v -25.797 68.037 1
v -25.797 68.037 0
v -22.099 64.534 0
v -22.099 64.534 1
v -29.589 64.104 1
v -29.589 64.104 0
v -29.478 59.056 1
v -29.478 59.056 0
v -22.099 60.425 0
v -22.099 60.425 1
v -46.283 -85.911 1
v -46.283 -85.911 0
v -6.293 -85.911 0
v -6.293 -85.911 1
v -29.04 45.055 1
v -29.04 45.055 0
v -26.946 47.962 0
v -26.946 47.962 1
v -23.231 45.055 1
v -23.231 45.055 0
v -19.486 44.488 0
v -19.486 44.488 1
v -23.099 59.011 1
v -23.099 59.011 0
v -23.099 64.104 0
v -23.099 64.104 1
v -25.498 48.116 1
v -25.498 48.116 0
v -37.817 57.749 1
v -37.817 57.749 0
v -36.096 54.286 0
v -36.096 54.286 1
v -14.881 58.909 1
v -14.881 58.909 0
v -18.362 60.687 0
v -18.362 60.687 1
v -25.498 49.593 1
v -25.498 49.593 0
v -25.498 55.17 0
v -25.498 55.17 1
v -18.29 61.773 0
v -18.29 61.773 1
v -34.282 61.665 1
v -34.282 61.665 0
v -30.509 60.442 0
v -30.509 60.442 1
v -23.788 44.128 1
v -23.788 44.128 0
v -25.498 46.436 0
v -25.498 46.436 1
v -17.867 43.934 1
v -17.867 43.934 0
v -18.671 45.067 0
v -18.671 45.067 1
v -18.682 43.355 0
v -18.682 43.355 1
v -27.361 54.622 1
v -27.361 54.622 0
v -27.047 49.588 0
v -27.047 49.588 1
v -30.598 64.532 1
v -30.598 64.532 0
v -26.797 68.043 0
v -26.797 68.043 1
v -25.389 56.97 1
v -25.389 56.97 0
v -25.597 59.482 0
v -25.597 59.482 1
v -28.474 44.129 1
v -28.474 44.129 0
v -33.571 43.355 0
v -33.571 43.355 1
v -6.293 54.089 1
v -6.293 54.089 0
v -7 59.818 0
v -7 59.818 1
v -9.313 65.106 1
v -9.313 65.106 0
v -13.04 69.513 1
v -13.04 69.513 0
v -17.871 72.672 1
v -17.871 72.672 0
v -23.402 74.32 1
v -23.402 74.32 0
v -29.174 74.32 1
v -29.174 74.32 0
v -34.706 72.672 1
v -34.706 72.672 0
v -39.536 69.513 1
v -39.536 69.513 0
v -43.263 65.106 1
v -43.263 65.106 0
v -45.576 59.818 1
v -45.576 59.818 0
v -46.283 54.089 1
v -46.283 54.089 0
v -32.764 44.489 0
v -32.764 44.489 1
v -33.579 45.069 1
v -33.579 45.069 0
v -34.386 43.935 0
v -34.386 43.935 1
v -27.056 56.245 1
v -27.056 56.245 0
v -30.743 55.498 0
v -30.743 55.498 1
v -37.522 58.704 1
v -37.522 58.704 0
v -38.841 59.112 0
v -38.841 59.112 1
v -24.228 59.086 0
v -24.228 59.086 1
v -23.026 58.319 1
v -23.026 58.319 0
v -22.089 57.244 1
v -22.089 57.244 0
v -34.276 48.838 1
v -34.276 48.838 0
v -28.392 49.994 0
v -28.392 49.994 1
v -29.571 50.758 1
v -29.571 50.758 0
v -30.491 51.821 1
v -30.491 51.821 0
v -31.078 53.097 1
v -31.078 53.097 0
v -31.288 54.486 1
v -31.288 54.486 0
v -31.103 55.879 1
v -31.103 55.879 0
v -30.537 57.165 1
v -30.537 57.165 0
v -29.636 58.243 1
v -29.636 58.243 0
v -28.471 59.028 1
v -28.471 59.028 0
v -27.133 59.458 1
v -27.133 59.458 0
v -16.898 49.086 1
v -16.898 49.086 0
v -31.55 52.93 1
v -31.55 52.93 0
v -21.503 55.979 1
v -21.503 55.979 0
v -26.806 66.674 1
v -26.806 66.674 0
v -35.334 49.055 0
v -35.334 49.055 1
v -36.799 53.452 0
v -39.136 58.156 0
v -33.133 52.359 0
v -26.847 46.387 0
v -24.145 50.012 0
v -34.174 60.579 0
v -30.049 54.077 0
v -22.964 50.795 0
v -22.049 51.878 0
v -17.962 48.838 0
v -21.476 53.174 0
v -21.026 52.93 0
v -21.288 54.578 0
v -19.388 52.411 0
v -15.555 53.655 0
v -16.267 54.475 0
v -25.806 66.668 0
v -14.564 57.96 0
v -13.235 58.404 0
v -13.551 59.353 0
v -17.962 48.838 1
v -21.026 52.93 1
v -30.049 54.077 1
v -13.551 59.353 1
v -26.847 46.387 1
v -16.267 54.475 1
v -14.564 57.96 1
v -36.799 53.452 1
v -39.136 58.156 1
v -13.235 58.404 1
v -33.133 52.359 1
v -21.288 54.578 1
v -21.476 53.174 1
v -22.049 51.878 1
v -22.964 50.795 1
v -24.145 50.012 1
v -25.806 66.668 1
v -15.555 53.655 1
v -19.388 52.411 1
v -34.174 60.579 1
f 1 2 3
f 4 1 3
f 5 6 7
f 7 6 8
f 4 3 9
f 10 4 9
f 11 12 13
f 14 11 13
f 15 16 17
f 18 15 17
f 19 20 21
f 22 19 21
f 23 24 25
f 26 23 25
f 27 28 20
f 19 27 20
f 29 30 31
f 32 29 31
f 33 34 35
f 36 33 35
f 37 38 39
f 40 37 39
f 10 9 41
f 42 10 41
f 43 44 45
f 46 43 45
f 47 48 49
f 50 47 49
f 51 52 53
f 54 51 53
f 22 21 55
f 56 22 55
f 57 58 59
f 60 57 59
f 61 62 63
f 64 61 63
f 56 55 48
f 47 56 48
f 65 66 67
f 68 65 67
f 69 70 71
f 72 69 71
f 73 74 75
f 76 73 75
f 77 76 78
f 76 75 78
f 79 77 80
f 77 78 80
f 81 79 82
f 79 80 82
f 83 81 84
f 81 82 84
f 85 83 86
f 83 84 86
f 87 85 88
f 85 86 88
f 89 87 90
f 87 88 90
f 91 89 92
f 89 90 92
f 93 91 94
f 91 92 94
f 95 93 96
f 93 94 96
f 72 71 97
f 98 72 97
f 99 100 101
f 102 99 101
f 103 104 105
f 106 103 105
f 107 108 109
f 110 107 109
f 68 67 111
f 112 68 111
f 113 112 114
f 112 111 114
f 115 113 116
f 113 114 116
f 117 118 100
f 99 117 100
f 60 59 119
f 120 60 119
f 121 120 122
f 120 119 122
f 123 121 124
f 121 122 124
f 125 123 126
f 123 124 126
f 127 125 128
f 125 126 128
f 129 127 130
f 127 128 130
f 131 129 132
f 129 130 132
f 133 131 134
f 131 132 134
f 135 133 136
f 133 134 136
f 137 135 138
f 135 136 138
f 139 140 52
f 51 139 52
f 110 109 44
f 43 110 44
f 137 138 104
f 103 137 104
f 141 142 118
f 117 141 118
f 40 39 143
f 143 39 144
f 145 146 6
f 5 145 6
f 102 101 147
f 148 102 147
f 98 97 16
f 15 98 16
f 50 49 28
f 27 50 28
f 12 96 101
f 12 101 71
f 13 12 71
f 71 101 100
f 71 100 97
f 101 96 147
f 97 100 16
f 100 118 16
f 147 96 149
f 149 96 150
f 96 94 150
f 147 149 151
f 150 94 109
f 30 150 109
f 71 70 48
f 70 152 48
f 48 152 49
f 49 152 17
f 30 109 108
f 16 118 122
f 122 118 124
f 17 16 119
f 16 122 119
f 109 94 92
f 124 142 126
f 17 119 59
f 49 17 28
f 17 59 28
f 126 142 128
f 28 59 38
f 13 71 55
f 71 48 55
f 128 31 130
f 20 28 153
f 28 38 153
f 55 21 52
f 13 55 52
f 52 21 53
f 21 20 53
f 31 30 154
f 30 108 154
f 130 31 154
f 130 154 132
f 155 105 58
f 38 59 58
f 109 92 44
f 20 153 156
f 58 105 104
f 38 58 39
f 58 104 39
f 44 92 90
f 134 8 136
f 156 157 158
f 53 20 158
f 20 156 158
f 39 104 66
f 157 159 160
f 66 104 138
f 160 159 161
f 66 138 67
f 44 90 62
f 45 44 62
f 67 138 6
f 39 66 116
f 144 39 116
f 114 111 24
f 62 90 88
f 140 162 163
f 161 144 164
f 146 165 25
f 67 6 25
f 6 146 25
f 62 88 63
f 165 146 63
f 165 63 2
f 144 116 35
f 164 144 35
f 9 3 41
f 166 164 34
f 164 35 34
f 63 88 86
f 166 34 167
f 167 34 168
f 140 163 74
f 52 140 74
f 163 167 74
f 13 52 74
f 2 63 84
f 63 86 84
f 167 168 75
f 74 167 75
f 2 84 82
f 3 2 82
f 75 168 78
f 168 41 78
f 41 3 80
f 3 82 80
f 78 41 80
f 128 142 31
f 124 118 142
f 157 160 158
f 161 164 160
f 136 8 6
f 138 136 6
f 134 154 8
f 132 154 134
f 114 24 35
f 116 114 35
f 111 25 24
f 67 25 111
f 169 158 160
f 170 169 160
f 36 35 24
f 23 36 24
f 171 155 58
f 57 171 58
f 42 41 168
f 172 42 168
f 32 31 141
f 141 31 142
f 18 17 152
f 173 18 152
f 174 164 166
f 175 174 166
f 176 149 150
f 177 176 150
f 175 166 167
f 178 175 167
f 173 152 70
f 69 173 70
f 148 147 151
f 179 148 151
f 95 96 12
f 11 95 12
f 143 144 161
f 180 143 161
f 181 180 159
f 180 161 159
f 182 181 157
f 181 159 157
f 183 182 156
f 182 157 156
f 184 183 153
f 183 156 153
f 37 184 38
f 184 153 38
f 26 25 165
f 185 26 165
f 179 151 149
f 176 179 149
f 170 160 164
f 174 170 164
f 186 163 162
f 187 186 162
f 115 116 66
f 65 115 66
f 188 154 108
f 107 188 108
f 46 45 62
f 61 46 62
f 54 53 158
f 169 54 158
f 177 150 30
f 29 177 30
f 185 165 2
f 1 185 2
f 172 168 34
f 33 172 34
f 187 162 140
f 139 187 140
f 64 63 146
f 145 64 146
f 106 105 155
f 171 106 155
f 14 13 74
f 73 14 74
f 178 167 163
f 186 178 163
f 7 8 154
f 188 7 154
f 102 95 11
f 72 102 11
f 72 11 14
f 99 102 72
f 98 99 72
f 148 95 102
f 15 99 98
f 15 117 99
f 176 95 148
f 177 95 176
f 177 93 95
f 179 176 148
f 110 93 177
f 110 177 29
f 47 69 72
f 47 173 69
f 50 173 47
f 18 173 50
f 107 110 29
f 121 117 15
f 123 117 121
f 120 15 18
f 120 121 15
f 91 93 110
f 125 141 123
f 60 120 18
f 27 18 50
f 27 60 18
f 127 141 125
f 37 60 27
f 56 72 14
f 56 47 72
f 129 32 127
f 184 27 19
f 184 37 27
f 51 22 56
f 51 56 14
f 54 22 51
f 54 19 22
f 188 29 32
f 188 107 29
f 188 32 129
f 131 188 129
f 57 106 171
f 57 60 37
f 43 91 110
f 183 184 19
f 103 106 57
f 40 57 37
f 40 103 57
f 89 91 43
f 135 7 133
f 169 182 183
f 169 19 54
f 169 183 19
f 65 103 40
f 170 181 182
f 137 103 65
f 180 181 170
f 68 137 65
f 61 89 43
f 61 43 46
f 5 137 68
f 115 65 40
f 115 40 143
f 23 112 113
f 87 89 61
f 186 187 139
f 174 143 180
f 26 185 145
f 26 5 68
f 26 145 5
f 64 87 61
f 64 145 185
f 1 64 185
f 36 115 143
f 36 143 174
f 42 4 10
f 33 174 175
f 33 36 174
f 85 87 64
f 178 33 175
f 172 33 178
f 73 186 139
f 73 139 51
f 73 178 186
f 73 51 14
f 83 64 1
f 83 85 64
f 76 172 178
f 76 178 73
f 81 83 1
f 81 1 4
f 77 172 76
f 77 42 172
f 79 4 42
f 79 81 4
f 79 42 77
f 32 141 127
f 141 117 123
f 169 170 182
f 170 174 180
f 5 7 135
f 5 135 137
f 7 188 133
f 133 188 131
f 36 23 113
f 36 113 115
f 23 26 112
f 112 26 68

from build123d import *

# Parameters (mm, degrees)
F1_DEPTH = 1


with BuildPart() as f1:
    # F0 (on Top) → F1 (new body)
    with BuildSketch(Plane.XY):
        with BuildLine():
            Line((-6.292982, -85.910741), (-6.292982, 54.089259))
            ThreePointArc((-6.292982, 54.089259), (-26.288129, 74.529796), (-46.283277, 54.089259))
            Line((-46.283277, 54.089259), (-46.283277, -85.910741))
            Line((-46.283277, -85.910741), (-6.292982, -85.910741))
        make_face()
        Polygon((-39.135793, 58.156283), (-37.816775, 57.748809), (-36.096451, 54.285815), (-31.550451, 52.930429), (-34.276498, 48.838314), (-33.578717, 45.068727), (-34.385781, 43.934663), (-35.333624, 49.055149), (-33.132877, 52.358728), (-36.79867, 53.451681), align=None, mode=Mode.SUBTRACT)
        Polygon((-33.571035, 43.354844), (-32.763971, 44.488907), (-29.039516, 45.054648), (-26.94571, 47.962227), (-26.847435, 46.38745), (-28.473701, 44.129124), align=None, mode=Mode.SUBTRACT)
        Polygon((-29.588758, 64.103655), (-29.478391, 59.056225), (-34.174348, 60.578728), (-37.521616, 58.704257), (-38.840633, 59.111731), (-34.281651, 61.664762), (-30.508922, 60.441584), (-30.598373, 64.532466), (-26.796919, 68.043156), (-26.805587, 66.673948), align=None, mode=Mode.SUBTRACT)
        with BuildLine():
            Line((-30.048708, 54.077201), (-27.361293, 54.621597))
            Line((-27.361293, 54.621597), (-27.047152, 49.587743))
            ThreePointArc((-27.047152, 49.587743), (-31.287939, 54.486218), (-27.133178, 59.457868))
            Line((-27.133178, 59.457868), (-27.056337, 56.245149))
            Line((-27.056337, 56.245149), (-30.742993, 55.498334))
            Line((-30.742993, 55.498334), (-30.048708, 54.077201))
        make_face(mode=Mode.SUBTRACT)
        Polygon((-25.498227, 46.435824), (-25.498227, 48.115821), (-23.230623, 45.054648), (-19.486444, 44.488301), (-18.682042, 43.355251), (-23.788412, 44.127645), align=None, mode=Mode.SUBTRACT)
        with BuildLine():
            Line((-25.498227, 49.592584), (-25.498227, 55.169558))
            Line((-25.498227, 55.169558), (-21.502735, 55.978935))
            ThreePointArc((-21.502735, 55.978935), (-22.049338, 51.877881), (-25.498227, 49.592584))
        make_face(mode=Mode.SUBTRACT)
        Polygon((-17.866638, 43.934143), (-18.67104, 45.067193), (-17.961659, 48.838314), (-21.025808, 52.930429), (-16.2674, 54.475481), (-14.564381, 57.960362), (-13.23457, 58.40398), (-15.555168, 53.655348), (-19.387565, 52.410971), (-16.897593, 49.085659), align=None, mode=Mode.SUBTRACT)
        with BuildLine():
            Line((-22.088989, 57.244058), (-25.388635, 56.97))
            Line((-25.388635, 56.97), (-25.597259, 59.481836))
            ThreePointArc((-25.597259, 59.481836), (-23.599271, 58.745248), (-22.088989, 57.244058))
        make_face(mode=Mode.SUBTRACT)
        Polygon((-13.55102, 59.352589), (-14.880832, 58.908971), (-18.361953, 60.687206), (-23.098863, 59.010709), (-23.098863, 64.103655), (-25.805607, 66.667618), (-25.796939, 68.036826), (-22.098863, 64.533824), (-22.098863, 60.425414), (-18.290102, 61.773419), align=None, mode=Mode.SUBTRACT)
    extrude(amount=F1_DEPTH)


solid = f1.part
